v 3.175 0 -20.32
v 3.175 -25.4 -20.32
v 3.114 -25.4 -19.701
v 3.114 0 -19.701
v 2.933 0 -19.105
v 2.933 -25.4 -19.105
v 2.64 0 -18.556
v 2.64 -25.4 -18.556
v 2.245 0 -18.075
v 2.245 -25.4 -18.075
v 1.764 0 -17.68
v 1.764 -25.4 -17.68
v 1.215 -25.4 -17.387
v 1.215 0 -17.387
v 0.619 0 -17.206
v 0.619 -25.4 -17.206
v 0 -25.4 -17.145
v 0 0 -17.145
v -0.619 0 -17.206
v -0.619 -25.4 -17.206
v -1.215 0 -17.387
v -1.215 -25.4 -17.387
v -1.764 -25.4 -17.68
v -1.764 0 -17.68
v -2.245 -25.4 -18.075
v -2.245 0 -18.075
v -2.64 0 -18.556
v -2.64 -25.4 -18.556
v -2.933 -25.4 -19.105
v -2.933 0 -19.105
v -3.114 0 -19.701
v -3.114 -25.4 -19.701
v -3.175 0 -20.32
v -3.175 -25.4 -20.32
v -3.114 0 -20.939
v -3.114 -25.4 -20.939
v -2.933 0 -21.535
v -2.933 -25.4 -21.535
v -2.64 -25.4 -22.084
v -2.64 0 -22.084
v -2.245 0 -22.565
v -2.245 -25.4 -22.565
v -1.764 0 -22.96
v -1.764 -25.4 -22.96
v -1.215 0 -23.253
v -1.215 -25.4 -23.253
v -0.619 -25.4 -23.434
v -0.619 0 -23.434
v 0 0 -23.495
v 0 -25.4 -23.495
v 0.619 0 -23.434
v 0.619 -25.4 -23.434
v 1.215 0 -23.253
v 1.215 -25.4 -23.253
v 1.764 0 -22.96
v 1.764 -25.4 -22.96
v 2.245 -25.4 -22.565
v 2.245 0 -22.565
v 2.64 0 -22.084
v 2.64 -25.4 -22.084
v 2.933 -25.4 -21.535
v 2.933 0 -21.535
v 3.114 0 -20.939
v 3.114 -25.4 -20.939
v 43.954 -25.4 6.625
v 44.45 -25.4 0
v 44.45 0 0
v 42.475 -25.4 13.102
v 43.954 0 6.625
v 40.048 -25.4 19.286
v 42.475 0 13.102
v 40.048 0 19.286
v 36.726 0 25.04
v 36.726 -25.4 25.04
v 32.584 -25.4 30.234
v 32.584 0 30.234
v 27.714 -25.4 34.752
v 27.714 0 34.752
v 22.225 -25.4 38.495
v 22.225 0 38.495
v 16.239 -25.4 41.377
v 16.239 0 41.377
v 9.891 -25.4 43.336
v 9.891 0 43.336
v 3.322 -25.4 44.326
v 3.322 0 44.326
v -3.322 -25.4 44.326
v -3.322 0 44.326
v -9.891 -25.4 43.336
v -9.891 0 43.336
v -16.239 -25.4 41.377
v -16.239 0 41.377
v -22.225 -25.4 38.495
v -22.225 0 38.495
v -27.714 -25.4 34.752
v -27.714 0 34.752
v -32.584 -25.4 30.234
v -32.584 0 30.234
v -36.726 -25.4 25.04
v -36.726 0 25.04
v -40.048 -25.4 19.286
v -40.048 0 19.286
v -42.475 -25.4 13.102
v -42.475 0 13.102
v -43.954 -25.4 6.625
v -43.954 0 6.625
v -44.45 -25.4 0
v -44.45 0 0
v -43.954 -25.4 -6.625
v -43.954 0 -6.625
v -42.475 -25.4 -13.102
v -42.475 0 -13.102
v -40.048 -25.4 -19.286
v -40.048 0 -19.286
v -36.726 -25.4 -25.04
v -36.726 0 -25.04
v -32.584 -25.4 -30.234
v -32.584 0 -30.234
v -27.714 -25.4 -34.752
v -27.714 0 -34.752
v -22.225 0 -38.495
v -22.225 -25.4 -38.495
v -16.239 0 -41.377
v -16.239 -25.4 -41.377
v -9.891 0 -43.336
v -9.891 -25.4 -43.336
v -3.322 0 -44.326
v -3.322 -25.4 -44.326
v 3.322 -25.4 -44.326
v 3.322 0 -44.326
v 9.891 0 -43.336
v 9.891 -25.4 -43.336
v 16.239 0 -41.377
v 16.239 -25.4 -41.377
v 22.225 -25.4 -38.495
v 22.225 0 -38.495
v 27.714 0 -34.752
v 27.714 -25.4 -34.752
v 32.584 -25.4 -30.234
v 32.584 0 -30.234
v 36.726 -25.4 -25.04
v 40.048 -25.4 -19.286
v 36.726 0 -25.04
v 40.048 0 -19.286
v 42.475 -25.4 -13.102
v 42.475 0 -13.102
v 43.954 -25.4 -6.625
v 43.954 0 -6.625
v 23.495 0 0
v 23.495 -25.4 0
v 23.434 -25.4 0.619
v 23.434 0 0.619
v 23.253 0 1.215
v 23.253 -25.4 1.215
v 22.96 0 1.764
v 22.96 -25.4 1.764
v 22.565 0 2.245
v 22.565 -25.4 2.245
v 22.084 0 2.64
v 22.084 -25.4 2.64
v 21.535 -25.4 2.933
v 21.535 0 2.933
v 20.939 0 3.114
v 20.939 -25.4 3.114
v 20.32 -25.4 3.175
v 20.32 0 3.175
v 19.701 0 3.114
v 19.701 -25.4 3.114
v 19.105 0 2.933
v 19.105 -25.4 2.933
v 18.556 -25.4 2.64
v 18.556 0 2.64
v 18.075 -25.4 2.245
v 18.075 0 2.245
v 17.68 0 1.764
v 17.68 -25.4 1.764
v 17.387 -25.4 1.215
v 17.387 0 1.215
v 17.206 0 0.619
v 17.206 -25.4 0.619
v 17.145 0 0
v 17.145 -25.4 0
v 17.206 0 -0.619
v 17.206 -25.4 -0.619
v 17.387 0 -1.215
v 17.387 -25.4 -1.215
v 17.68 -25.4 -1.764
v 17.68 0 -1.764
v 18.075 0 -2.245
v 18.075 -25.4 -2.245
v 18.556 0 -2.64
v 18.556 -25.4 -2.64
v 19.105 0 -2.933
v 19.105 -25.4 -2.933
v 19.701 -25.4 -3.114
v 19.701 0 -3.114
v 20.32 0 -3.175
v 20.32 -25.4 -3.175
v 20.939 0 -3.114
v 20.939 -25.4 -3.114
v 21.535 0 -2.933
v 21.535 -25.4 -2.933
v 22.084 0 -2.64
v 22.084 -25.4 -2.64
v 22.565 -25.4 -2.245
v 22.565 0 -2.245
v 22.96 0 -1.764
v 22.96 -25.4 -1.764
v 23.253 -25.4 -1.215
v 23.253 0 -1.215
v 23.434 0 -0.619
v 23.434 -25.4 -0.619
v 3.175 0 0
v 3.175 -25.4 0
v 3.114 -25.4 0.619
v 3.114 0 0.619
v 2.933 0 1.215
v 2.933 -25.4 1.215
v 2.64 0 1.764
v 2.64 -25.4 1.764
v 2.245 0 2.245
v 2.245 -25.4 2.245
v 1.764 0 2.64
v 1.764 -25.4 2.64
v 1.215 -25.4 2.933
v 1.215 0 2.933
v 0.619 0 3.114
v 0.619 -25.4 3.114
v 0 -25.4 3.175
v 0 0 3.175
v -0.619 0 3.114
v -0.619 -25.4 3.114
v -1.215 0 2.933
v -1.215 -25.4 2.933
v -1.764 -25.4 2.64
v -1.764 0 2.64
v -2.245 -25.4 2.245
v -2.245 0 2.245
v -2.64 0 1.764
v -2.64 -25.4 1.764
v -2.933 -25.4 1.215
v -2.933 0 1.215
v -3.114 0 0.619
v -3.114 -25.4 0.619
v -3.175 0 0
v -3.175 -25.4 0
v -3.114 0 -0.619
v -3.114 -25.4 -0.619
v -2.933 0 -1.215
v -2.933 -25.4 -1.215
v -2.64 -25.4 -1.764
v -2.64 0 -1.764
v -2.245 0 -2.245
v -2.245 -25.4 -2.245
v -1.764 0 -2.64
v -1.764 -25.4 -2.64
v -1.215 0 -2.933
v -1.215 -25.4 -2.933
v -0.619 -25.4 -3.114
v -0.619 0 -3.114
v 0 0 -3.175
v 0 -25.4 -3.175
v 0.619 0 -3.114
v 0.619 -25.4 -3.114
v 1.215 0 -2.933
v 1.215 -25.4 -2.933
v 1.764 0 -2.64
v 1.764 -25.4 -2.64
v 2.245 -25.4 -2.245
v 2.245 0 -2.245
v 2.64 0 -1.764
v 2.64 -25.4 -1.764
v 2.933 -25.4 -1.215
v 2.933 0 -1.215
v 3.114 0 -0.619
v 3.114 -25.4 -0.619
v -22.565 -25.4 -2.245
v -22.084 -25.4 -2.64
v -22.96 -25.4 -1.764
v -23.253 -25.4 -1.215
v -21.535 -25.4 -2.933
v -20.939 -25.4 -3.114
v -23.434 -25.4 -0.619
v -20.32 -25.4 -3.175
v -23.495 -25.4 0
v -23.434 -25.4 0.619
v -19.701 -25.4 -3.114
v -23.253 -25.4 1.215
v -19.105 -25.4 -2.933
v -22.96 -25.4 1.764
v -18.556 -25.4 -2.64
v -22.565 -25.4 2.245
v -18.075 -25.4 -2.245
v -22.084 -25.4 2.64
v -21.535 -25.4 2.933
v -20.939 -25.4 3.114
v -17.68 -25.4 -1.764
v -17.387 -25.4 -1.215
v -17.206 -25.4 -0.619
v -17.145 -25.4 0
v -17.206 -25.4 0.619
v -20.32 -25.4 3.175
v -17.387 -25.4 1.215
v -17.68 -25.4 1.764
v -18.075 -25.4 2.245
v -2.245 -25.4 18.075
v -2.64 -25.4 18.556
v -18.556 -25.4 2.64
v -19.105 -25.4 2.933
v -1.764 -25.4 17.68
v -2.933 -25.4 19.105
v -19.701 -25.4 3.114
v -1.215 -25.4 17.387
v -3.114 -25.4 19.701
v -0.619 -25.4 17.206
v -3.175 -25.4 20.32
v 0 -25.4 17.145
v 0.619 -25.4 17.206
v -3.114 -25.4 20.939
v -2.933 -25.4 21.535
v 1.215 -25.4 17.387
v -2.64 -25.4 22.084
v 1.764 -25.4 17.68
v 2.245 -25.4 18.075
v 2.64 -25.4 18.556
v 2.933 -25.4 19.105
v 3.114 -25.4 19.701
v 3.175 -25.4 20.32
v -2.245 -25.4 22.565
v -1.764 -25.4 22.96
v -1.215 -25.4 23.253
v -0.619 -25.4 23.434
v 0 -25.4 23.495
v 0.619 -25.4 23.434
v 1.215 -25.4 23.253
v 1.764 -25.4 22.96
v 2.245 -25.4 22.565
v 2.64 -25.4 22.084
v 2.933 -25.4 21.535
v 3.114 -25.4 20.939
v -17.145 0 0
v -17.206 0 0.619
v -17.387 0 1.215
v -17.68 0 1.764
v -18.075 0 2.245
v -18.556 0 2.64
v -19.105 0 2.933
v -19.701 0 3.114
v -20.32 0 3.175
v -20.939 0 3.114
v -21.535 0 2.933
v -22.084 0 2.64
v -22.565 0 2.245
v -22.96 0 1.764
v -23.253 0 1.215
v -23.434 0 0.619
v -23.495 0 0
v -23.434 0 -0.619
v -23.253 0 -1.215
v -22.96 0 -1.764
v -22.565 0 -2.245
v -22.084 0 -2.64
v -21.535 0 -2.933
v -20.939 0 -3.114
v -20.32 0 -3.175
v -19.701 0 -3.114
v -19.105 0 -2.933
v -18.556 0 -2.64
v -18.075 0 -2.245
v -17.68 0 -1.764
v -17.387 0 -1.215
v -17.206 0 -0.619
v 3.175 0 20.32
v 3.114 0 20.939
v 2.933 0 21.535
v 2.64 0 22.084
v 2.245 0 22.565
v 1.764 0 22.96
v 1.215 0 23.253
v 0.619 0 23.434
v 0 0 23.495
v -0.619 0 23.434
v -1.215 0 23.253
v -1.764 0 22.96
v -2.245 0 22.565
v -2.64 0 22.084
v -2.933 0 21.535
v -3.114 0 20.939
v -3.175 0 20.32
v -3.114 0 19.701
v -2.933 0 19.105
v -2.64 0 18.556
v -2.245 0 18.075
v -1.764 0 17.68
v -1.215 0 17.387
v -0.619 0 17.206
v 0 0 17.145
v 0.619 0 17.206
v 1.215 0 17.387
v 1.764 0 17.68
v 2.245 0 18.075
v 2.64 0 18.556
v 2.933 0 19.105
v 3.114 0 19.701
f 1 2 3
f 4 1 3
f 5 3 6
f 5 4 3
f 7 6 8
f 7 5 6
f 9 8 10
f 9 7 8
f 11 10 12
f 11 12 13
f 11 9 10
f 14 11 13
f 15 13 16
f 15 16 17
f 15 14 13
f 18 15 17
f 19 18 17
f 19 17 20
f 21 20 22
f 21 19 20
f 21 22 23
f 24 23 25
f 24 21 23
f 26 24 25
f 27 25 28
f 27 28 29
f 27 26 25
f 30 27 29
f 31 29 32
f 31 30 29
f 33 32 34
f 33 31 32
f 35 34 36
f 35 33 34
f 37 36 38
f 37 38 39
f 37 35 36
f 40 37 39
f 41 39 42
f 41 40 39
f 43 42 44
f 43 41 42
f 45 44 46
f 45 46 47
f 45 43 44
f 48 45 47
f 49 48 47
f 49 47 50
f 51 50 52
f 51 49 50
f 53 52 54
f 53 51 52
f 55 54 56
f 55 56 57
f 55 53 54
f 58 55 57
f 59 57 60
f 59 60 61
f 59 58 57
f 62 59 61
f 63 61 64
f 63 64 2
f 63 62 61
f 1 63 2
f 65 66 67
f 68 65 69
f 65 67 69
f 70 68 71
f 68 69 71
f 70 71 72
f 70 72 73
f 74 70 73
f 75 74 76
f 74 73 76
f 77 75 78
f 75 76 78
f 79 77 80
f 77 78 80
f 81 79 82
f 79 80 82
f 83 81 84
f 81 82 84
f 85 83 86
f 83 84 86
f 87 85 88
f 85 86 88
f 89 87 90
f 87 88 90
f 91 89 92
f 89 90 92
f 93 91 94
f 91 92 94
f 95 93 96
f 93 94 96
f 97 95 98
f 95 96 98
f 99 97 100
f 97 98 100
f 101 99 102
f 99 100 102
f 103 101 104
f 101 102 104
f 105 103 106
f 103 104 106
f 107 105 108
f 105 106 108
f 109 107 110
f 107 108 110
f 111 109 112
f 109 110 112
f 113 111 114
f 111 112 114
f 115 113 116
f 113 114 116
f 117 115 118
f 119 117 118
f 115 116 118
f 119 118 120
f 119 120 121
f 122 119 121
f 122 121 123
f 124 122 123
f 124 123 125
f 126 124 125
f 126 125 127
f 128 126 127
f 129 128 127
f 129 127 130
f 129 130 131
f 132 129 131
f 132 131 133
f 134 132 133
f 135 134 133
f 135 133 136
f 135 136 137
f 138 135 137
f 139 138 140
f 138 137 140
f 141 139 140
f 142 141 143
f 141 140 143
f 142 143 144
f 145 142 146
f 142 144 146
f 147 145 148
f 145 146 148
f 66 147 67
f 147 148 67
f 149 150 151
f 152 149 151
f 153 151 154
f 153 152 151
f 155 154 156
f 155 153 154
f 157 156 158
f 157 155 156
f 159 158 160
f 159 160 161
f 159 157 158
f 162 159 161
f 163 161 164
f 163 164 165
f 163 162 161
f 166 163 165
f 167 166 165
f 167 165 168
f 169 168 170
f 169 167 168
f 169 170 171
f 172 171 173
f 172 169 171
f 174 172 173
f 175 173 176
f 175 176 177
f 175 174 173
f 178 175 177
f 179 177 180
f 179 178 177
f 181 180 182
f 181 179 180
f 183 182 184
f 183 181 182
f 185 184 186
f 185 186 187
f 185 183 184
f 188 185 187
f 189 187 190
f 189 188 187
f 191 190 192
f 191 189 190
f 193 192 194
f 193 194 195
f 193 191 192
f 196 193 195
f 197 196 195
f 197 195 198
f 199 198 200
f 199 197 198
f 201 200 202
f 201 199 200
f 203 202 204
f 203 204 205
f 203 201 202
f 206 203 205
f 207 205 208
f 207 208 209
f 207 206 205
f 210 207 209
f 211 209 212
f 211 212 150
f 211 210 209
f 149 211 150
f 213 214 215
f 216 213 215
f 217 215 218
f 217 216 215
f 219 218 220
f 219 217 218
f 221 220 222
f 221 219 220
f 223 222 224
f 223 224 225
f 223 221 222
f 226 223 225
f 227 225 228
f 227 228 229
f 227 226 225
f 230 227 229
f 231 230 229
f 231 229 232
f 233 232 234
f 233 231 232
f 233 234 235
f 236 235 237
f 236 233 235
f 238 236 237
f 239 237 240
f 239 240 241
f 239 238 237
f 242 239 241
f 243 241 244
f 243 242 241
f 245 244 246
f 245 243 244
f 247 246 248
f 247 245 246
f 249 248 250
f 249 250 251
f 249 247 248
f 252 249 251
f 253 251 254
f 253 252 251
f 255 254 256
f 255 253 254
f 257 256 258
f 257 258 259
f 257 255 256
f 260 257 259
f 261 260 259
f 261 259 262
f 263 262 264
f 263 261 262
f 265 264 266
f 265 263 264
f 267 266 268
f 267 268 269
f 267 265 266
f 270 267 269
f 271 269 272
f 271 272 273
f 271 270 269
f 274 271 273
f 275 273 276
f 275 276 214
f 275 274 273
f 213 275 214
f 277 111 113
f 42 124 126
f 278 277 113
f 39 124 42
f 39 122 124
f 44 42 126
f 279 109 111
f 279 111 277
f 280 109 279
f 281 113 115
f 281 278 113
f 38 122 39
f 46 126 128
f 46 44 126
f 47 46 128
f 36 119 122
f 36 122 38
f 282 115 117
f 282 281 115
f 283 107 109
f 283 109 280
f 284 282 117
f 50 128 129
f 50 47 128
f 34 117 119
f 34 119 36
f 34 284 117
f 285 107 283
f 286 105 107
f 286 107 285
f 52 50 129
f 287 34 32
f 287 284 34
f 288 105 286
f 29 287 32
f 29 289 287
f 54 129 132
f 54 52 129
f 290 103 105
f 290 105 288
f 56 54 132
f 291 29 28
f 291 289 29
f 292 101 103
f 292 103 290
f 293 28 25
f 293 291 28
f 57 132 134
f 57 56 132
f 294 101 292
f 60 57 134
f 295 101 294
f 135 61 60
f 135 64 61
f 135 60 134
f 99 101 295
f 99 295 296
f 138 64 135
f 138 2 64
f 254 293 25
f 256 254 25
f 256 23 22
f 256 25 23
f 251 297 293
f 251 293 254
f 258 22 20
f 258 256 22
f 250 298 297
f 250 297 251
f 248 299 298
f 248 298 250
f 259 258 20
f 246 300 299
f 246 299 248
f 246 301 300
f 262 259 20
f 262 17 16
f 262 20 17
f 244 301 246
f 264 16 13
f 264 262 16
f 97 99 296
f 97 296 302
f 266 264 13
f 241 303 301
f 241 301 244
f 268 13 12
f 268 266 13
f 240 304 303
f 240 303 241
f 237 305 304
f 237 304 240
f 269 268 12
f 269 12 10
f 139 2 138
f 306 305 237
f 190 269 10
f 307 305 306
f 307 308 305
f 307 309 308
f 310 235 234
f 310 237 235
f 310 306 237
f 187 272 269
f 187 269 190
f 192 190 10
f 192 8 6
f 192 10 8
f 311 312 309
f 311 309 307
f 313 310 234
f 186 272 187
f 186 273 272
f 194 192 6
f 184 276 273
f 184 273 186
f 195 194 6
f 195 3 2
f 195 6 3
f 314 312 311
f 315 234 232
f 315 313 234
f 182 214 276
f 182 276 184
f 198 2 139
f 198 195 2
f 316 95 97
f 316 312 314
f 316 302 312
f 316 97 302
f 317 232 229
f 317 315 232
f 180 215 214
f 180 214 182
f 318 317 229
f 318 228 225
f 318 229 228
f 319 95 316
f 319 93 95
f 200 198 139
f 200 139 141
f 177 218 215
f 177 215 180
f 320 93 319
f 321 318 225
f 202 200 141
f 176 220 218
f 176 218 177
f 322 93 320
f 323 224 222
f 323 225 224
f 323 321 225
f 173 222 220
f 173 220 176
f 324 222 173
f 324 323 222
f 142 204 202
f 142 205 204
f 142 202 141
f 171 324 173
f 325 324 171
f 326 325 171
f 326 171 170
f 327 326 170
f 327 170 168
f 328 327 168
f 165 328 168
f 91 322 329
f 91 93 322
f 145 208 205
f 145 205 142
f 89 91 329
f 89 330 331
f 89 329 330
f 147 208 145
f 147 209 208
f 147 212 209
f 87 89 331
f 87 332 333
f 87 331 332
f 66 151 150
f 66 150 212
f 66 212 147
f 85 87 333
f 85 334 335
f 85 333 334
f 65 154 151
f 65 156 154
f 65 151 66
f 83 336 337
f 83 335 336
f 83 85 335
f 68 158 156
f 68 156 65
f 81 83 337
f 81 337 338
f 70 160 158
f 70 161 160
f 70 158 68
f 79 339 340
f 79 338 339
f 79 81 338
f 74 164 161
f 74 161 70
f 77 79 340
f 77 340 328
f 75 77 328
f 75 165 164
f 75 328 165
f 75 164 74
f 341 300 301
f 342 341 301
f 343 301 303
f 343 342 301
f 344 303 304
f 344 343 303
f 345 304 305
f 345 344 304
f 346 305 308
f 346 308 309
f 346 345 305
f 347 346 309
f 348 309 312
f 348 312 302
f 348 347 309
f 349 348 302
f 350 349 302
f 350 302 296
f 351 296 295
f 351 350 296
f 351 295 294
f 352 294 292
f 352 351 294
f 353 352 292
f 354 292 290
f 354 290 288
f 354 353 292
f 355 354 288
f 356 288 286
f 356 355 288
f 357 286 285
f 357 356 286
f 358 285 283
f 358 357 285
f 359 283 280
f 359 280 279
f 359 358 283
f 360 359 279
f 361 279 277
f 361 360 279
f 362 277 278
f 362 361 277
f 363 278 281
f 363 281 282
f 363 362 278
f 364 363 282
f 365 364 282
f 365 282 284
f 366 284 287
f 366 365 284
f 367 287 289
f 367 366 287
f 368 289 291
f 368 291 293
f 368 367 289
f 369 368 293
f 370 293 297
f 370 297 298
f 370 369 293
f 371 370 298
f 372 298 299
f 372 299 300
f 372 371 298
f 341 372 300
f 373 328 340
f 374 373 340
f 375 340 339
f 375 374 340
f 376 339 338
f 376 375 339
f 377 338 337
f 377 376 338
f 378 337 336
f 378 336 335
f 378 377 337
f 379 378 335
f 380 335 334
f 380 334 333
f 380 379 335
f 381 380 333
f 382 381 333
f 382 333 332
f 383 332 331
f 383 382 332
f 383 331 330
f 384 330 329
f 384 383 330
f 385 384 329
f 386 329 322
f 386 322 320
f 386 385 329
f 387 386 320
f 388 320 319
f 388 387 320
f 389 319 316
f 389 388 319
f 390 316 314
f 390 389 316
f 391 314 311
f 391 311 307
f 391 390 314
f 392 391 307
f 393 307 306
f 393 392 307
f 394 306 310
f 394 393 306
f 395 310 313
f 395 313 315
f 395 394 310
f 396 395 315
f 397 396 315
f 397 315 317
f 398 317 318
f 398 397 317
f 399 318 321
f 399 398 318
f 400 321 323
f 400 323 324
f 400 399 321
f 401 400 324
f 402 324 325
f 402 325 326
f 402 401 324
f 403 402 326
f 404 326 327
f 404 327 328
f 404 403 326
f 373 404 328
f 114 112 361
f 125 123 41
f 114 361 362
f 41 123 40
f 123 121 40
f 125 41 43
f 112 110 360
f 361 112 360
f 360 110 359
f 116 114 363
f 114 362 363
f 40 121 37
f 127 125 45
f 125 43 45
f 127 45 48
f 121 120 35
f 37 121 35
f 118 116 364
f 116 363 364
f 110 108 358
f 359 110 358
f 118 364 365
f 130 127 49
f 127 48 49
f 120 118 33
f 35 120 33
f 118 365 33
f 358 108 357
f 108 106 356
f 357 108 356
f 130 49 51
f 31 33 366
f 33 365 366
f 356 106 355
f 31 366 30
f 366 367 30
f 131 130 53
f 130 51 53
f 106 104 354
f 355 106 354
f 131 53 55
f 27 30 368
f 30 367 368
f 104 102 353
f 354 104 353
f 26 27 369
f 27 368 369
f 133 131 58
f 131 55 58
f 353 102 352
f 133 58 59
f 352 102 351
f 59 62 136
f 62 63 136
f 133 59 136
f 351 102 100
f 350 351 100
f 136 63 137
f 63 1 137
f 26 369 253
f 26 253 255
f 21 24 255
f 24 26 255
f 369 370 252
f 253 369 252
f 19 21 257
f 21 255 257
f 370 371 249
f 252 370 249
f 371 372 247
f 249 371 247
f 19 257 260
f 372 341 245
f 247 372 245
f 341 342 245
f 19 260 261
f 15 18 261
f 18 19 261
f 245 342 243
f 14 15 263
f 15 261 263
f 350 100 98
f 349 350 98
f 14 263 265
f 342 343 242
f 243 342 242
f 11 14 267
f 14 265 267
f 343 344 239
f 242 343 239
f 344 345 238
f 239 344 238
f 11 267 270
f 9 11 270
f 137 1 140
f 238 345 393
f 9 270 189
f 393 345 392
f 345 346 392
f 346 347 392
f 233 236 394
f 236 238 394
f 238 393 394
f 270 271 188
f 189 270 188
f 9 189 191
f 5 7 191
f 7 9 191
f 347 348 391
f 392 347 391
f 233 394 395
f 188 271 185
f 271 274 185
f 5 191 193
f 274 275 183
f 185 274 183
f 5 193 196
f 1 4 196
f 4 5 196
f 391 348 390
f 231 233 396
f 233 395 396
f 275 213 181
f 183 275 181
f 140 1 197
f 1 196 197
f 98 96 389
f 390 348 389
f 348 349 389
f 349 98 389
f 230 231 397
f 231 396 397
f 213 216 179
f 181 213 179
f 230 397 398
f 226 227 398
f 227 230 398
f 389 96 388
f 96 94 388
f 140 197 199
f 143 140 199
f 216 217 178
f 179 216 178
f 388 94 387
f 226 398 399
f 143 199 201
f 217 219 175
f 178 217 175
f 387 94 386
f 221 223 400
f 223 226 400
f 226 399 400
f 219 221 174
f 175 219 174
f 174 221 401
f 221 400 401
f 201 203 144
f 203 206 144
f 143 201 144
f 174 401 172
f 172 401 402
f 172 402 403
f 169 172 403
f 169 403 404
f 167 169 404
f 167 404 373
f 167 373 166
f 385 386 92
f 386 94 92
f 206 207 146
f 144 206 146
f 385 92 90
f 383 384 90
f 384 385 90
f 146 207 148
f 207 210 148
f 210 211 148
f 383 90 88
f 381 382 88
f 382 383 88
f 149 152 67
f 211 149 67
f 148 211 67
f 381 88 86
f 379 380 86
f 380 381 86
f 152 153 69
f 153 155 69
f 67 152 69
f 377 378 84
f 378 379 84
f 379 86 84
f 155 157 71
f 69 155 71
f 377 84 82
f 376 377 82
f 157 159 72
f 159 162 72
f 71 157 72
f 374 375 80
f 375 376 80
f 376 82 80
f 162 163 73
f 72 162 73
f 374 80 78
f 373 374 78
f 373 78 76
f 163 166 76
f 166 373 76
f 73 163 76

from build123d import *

# Parameters (mm, degrees)
F0_R     = 44.45
F0_R_2   = 3.175
F1_DEPTH = 25.4


with BuildPart() as f1:
    # F0 (on Front) → F1 (new body)
    with BuildSketch(Plane.XZ):
        Circle(F0_R)
        with Locations((0, -20.32)):
            Circle(F0_R_2, mode=Mode.SUBTRACT)
        with Locations((-20.32, 0)):
            Circle(F0_R_2, mode=Mode.SUBTRACT)
        Circle(F0_R_2, mode=Mode.SUBTRACT)
        with Locations((20.32, 0)):
            Circle(F0_R_2, mode=Mode.SUBTRACT)
        with Locations((0, 20.32)):
            Circle(F0_R_2, mode=Mode.SUBTRACT)
    extrude(amount=F1_DEPTH)


solid = f1.part
